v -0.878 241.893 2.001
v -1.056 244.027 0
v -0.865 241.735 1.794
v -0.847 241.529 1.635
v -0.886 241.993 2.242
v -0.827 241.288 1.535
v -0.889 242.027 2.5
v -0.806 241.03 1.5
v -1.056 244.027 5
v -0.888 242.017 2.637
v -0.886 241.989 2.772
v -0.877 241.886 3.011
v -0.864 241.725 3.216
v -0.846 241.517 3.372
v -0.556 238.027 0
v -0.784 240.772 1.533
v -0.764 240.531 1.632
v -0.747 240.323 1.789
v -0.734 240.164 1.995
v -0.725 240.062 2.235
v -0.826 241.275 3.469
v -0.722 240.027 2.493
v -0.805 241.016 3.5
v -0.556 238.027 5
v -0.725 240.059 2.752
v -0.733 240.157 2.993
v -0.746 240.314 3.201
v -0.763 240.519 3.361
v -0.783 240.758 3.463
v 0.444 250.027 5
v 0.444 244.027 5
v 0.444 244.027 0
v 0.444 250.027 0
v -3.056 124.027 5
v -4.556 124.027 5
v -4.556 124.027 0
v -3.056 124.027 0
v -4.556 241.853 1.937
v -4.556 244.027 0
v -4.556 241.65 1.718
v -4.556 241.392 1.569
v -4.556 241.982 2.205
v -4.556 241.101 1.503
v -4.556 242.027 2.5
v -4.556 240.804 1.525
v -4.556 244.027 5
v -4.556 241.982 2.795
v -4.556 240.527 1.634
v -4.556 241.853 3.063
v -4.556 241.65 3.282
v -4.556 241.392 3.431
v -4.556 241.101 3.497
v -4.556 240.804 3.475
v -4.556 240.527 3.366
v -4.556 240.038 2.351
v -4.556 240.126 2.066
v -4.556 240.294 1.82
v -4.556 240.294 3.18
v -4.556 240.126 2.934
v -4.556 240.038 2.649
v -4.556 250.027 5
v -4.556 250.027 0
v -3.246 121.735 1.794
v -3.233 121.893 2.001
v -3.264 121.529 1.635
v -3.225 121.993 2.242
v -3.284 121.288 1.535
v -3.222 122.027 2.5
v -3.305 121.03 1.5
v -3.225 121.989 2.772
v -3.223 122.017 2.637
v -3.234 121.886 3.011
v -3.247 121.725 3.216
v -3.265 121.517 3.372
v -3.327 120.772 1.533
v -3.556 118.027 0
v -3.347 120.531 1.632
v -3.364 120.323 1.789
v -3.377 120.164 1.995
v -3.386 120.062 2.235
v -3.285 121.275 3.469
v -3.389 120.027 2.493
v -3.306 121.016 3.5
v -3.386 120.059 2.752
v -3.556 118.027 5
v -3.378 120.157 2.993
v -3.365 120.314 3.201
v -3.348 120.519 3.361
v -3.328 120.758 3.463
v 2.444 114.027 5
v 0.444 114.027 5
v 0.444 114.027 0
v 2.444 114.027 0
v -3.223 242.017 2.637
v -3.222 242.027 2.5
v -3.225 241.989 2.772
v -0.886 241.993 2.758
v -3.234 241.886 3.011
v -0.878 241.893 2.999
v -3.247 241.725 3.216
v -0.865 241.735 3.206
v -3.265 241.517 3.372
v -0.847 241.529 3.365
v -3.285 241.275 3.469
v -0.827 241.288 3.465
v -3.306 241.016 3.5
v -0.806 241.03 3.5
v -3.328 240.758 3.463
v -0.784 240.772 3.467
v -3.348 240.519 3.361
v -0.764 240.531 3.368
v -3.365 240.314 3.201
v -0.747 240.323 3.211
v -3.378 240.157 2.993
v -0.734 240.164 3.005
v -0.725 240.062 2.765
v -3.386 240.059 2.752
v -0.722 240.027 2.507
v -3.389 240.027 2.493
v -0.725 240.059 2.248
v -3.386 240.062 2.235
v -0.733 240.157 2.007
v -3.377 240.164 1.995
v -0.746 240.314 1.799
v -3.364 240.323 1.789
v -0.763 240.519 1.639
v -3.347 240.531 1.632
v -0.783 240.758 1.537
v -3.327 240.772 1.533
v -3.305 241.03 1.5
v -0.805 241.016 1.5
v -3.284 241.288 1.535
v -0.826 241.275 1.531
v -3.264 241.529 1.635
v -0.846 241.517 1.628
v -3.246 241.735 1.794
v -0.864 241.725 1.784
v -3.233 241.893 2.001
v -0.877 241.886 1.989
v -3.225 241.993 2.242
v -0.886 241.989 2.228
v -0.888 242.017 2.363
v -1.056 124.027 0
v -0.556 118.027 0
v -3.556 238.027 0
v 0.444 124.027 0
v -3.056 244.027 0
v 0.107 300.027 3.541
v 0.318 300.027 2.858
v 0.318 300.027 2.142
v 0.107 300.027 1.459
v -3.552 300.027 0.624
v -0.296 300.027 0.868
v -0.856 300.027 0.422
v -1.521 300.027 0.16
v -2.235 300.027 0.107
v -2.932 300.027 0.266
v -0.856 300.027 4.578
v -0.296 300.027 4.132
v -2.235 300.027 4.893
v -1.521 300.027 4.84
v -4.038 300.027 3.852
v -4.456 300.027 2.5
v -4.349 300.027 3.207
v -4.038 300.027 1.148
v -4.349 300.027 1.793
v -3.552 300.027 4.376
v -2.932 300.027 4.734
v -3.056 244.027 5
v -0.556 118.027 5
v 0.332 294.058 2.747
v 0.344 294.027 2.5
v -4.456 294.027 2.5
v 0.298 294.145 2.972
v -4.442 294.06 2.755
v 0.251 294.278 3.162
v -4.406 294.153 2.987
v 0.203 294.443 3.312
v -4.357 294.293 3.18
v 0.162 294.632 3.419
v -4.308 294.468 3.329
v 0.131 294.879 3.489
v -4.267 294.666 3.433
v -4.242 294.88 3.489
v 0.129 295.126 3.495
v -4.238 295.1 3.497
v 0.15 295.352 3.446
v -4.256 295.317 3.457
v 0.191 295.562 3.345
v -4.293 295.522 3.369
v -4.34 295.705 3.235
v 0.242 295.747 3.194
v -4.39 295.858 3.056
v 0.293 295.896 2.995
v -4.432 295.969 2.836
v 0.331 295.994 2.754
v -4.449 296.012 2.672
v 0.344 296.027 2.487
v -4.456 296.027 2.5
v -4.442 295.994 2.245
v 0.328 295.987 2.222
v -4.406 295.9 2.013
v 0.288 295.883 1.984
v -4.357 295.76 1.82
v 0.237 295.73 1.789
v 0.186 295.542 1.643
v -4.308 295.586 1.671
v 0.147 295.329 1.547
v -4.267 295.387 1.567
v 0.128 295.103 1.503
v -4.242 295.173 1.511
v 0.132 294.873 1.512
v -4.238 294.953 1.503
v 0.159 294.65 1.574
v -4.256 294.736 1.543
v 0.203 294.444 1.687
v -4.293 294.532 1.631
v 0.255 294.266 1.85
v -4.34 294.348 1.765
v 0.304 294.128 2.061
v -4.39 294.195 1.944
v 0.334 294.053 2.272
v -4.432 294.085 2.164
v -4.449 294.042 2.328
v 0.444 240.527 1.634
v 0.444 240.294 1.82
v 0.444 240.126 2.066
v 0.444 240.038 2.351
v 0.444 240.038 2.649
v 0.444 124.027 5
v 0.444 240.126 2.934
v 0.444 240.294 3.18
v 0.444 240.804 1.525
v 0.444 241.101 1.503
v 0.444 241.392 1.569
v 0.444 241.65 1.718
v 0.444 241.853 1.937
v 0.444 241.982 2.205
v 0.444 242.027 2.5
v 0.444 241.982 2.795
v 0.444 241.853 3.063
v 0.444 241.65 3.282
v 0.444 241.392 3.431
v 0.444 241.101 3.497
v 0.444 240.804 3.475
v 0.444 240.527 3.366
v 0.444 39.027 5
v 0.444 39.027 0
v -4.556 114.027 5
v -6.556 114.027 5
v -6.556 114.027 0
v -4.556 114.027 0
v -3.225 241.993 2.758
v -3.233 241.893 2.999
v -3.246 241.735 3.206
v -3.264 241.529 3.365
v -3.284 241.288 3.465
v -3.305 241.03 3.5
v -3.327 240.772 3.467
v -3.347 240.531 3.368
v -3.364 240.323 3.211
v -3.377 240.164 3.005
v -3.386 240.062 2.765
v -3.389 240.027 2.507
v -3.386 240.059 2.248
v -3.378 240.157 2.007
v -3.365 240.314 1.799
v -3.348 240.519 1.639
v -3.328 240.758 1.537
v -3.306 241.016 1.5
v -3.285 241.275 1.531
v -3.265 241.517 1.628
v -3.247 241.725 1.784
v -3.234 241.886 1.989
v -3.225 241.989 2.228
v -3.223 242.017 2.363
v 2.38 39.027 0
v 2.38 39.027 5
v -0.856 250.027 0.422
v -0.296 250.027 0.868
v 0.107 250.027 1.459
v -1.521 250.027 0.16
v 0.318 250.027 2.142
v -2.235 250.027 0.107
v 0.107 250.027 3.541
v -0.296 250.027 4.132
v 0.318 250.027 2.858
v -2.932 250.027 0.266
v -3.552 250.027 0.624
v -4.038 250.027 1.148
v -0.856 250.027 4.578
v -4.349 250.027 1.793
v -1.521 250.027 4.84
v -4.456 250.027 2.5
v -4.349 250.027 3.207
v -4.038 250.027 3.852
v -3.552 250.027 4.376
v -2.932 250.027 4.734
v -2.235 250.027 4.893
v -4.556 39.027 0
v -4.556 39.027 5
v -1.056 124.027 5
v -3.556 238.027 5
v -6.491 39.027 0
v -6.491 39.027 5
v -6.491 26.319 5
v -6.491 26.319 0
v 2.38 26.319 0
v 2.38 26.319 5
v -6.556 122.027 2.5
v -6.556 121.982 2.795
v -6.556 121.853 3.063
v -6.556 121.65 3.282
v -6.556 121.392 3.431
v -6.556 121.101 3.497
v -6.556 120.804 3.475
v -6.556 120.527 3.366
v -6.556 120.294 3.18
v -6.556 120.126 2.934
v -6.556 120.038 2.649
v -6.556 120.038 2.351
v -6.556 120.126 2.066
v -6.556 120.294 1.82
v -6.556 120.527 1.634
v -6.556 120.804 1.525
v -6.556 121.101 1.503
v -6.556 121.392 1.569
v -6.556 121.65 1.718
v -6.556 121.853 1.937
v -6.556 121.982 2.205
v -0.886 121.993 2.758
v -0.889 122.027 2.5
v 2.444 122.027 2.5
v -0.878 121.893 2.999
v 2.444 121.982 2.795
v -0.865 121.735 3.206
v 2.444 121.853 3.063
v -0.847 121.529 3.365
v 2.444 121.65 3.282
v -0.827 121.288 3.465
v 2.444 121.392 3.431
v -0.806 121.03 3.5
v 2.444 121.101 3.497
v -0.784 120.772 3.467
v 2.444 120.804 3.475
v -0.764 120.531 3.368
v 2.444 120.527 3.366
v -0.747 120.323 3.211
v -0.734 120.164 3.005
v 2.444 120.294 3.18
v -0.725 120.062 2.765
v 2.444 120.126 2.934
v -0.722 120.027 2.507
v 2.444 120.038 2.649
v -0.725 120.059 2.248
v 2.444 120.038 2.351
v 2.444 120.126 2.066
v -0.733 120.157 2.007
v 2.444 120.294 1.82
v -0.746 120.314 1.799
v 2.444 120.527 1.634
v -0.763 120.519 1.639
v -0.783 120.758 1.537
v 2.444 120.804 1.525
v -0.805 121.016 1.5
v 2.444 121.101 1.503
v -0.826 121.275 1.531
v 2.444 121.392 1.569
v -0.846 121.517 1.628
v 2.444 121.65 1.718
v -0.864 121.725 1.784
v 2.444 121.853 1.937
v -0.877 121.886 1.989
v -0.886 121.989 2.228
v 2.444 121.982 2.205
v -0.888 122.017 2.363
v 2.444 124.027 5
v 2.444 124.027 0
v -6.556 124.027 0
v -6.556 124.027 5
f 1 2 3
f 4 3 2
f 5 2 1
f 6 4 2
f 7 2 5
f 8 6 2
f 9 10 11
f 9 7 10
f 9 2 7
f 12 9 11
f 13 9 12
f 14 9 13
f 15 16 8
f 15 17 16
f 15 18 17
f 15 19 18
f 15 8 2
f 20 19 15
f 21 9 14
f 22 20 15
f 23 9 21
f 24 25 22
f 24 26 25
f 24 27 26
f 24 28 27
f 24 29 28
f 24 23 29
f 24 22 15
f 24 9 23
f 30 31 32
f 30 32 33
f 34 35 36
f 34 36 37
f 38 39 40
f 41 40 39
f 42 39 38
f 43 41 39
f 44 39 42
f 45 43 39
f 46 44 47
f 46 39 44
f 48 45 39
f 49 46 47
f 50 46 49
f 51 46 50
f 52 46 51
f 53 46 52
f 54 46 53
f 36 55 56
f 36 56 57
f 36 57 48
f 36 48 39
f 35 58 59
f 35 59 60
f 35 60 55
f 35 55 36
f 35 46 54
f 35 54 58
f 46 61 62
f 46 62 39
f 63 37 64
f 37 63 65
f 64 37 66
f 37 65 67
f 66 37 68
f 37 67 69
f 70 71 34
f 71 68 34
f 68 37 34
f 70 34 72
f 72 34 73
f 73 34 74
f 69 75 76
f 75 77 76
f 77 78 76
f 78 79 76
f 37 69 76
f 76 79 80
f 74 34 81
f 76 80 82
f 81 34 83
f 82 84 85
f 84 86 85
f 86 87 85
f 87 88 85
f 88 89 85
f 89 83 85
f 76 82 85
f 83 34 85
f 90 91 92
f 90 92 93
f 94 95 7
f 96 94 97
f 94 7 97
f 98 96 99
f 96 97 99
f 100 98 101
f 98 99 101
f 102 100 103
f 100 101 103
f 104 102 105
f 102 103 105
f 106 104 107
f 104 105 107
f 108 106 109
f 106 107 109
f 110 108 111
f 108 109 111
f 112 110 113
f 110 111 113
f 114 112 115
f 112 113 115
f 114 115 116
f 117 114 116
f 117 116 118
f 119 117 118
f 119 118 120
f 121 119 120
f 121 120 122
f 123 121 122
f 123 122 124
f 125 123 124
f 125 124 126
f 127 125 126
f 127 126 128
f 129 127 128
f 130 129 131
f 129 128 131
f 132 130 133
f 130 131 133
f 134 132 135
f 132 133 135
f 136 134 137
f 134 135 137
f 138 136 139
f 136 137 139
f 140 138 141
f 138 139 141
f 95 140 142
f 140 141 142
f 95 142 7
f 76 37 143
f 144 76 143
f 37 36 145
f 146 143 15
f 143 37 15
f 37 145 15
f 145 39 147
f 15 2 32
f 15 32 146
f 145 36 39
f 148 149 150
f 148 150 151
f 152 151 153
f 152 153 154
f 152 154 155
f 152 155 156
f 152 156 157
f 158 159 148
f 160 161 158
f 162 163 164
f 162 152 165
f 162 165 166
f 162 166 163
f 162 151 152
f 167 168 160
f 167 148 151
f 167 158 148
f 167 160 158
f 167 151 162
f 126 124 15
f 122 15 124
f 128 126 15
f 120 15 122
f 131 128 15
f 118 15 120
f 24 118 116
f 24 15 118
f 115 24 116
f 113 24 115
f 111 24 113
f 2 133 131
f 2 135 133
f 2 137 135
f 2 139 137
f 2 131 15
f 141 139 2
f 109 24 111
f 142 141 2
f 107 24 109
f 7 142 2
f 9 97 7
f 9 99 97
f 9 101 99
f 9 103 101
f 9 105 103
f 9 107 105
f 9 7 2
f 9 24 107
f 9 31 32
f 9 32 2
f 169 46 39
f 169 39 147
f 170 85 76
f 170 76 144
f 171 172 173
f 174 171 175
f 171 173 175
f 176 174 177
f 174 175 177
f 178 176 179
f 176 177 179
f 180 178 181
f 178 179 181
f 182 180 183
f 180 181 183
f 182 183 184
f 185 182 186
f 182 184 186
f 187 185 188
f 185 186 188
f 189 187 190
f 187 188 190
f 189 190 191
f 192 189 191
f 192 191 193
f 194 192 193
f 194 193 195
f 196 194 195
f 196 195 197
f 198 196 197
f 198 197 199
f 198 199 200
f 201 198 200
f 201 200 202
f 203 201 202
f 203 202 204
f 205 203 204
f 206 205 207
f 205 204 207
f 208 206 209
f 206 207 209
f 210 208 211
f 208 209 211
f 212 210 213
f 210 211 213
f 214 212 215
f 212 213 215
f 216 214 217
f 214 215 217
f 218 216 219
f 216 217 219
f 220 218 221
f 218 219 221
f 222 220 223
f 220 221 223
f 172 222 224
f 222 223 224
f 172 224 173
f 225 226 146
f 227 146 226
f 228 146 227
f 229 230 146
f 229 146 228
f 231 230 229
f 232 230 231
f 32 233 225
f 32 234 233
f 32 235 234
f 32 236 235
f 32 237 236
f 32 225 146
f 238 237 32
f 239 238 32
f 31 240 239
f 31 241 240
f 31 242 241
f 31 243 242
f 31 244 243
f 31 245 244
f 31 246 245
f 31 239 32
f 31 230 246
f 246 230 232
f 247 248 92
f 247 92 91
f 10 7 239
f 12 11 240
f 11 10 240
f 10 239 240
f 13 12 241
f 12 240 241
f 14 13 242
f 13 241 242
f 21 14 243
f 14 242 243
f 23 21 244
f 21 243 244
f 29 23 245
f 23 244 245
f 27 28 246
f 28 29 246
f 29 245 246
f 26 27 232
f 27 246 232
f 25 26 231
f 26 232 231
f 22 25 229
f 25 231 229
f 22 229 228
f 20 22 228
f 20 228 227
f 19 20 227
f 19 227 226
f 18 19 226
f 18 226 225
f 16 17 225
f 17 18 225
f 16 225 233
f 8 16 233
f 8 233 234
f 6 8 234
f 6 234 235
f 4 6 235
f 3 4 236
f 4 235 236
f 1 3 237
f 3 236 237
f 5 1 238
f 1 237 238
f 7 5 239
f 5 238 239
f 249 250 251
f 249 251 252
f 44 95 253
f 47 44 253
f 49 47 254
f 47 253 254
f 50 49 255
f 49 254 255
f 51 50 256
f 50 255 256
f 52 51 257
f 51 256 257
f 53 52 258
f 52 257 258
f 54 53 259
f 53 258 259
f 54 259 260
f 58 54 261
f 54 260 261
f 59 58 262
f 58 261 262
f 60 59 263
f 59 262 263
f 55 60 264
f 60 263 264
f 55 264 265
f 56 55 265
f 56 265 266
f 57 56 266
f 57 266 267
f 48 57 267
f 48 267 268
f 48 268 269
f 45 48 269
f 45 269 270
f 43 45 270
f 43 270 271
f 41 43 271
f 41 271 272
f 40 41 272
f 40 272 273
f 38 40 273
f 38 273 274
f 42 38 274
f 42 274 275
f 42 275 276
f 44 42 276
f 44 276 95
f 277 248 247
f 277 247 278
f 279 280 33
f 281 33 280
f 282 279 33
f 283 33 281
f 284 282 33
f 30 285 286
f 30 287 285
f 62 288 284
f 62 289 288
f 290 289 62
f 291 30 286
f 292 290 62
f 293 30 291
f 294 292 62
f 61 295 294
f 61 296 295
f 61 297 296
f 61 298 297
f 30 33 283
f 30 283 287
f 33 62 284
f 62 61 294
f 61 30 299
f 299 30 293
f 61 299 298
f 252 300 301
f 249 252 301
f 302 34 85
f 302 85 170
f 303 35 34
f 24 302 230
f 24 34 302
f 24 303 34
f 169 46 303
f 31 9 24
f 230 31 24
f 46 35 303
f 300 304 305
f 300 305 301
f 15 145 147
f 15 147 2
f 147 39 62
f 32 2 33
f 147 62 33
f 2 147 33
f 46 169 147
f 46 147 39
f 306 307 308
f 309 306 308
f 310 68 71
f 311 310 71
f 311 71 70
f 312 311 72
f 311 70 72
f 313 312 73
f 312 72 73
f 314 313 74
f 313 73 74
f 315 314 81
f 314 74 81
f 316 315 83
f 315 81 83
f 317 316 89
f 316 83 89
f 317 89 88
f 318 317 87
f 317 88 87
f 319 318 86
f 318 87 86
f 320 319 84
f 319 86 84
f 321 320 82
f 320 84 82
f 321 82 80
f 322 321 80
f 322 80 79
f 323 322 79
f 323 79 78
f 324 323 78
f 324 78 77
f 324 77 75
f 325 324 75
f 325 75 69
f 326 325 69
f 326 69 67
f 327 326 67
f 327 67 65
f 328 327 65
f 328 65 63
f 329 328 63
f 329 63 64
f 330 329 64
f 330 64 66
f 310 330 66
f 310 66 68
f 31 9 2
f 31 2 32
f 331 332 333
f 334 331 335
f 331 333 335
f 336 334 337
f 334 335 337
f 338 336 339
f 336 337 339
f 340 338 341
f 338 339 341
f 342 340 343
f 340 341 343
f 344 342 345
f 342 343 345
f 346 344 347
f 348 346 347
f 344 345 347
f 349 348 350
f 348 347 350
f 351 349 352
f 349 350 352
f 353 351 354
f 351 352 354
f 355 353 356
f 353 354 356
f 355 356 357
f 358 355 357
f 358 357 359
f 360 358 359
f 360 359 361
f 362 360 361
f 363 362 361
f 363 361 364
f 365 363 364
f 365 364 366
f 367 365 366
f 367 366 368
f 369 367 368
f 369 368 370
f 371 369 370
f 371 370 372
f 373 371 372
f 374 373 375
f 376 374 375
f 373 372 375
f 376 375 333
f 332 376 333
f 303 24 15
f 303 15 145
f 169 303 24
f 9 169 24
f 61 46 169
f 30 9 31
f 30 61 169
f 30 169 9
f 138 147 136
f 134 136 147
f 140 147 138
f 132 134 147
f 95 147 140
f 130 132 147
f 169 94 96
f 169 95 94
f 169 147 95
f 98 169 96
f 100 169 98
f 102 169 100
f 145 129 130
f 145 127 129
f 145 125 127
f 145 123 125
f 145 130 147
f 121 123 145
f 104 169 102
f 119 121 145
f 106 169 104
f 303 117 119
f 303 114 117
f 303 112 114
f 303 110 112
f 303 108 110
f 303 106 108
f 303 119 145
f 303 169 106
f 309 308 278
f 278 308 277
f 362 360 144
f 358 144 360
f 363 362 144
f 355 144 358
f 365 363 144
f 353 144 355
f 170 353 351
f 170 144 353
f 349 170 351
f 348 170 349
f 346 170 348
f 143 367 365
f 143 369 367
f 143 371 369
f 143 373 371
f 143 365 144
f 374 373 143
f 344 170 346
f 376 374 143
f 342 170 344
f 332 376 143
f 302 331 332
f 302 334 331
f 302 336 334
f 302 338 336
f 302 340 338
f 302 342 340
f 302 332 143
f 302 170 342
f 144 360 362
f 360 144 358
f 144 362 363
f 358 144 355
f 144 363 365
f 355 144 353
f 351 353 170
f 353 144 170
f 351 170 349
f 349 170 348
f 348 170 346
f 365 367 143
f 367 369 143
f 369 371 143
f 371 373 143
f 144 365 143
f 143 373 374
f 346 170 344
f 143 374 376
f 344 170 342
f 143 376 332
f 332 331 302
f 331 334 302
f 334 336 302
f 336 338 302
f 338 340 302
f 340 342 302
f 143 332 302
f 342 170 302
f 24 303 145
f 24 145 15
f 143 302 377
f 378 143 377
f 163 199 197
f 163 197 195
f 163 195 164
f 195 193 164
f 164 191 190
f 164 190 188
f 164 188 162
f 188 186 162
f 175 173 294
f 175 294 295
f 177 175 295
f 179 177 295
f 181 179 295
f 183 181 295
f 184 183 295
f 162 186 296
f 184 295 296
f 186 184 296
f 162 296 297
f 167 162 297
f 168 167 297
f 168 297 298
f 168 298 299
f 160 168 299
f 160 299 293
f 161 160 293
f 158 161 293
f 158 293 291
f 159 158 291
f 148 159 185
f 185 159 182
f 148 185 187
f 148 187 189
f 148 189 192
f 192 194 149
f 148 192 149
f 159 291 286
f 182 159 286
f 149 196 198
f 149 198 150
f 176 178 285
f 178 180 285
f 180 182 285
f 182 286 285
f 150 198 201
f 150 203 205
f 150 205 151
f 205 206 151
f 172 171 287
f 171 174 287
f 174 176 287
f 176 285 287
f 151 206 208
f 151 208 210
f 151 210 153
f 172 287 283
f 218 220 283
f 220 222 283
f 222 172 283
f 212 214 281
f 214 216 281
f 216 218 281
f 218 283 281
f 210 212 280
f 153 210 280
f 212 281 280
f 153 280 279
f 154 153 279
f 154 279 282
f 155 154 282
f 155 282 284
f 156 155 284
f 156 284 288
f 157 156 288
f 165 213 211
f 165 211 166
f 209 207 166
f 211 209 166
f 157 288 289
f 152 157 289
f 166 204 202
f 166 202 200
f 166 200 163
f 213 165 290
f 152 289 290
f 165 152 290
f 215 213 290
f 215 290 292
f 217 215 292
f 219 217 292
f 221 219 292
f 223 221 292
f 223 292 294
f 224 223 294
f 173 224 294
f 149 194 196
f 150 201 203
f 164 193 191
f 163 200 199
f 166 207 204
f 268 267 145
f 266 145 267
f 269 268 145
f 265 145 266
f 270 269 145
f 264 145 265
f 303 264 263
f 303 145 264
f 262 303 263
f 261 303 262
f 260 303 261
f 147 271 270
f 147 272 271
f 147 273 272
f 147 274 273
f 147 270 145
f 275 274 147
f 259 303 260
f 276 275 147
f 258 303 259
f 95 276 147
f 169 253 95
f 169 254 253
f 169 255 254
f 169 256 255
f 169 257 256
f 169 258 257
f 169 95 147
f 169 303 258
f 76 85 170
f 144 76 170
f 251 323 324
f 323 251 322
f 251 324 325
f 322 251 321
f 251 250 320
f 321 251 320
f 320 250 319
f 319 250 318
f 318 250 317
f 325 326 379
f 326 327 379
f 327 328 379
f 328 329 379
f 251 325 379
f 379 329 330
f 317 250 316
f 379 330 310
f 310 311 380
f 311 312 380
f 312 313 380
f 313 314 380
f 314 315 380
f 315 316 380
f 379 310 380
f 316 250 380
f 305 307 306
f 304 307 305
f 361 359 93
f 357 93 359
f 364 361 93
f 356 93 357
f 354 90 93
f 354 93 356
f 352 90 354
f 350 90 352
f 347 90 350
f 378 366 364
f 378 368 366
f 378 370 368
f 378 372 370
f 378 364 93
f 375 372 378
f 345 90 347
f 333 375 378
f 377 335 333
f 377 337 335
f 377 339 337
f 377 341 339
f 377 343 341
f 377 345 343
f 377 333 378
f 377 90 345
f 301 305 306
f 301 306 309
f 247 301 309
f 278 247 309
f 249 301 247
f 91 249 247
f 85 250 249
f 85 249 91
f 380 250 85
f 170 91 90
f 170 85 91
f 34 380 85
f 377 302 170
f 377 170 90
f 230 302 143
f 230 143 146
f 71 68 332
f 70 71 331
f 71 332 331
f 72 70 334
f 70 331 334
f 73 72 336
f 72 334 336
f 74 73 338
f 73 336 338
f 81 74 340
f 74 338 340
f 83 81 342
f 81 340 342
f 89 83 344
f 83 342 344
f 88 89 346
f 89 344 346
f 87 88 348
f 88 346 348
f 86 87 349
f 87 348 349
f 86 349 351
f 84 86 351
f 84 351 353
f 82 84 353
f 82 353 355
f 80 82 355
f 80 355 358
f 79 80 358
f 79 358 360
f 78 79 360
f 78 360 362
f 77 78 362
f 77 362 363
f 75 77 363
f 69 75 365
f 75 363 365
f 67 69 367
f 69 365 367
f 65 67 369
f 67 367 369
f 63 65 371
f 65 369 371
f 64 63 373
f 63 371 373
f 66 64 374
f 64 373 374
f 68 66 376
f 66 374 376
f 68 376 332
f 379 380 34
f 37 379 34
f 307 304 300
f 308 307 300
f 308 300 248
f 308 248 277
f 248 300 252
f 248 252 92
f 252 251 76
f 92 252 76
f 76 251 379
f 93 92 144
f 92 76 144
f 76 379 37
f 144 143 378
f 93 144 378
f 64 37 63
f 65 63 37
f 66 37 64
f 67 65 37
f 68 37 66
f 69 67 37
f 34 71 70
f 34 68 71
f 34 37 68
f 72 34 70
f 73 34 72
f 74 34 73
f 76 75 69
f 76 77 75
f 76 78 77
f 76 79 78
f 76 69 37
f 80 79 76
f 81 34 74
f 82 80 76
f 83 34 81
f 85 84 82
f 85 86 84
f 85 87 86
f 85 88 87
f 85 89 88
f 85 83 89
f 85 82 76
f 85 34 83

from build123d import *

# Parameters (mm, degrees)
F0_W           = 8.8713987993
F0_H           = 12.7076974937
F1_DEPTH       = 5
F2_W           = 5
F2_H           = 5
F3_DEPTH       = 85
F4_W           = 2
F4_H           = 10
F5_DEPTH       = 5
F6_DEPTH       = 5
F8_DEPTH       = 5
F9_R           = 1
F10_DEPTH      = 10
F11_R          = 1
F12_DEPTH      = 8
F12_DEPTH_BACK = 3
F13_DEPTH      = 5
F14_DEPTH      = 5
F15_R          = 2.4
F16_DEPTH      = 50
F17_R          = 1
F18_DEPTH      = 5
F19_DEPTH      = 5
F20_R          = 1
F21_DEPTH      = 5


# Not quite as in the source:
# - a feature names something its author has since deleted; it is built from what else it names


with BuildPart() as f1:
    # F0 (on Top) → F1 (new body)
    with BuildSketch(Plane.XY):
        with Locations((-2.0555156266, 32.6728799325)):
            Rectangle(F0_W, F0_H)
    extrude(amount=F1_DEPTH)

    # F2 (on face) → F3 (join)
    with BuildSketch(Plane(origin=(0, 39.0267286794, 0), x_dir=(-1, 0, 0), z_dir=(0, 1, 0))):
        with Locations((2.0555156266, 2.5)):
            Rectangle(F2_W, F2_H)
    extrude(amount=F3_DEPTH)

    # F4 (on face) → F5 (join)
    with BuildSketch(Plane.XY.offset(5)):
        with Locations((-5.5555156266, 119.0267286794)):
            Rectangle(F4_W, F4_H)
        with Locations((1.4444843734, 119.0267286794)):
            Rectangle(F4_W, F4_H)
    extrude(amount=-F5_DEPTH)

    # F4 (on face) → F6 (cut)
    with BuildSketch(Plane.XY.offset(5)):
        Polygon((-1.0555156266, 124.0267286794), (-3.0555156266, 124.0267286794), (-3.5555156266, 118.0267286794), (-0.5555156266, 118.0267286794), align=None)
    extrude(amount=-F6_DEPTH, mode=Mode.SUBTRACT)


with BuildPart() as f8:
    # F7 (on face) → F8 (new body)
    with BuildSketch(Plane.XY.offset(5)):
        Polygon((-1.0555156266, 124.0267286794), (0.4444843734, 124.0267286794), (0.4444843734, 244.0267286794), (-1.0555156266, 244.0267286794), (-0.5555156266, 238.0267286794), (-3.5555156266, 238.0267286794), (-3.0555156266, 244.0267286794), (-4.5555156266, 244.0267286794), (-4.5555156266, 124.0267286794), (-3.0555156266, 124.0267286794), (-3.5555156266, 118.0267286794), (-0.5555156266, 118.0267286794), align=None)
    extrude(amount=-F8_DEPTH)


with BuildPart() as f10_tool:
    # F9 (on face) → F10 (new body)
    with BuildSketch(Plane.YZ.offset(2.4444843734)):
        with Locations((121.0267286794, 2.5)):
            Circle(F9_R)
    extrude(amount=-F10_DEPTH)


with BuildPart() as f1_1:
    add(f1.part)

    # F10: cut by f10_tool
    add(f10_tool.part, mode=Mode.SUBTRACT)

    # F11 (on face) → F12 (cut, two sides)
    with BuildSketch(Plane.YZ.offset(0.4444843734)) as f12_sk:
        with Locations((121.0267286794, 2.5)):
            Circle(F11_R)
    extrude(amount=-F12_DEPTH, mode=Mode.SUBTRACT)
    extrude(f12_sk.sketch, amount=F12_DEPTH_BACK, mode=Mode.SUBTRACT)

    # F7 (on face) → F13 (cut)
    with BuildSketch(Plane.XY.offset(5)):
        Polygon((-1.0555156266, 244.0267286794), (0.4444843734, 244.0267286794), (0.4444843734, 250.0267286794), (-4.5555156266, 250.0267286794), (-4.5555156266, 244.0267286794), (-3.0555156266, 244.0267286794), (-3.5555156266, 238.0267286794), (-0.5555156266, 238.0267286794), align=None)
    extrude(amount=-F13_DEPTH, mode=Mode.SUBTRACT)

    # F17 (on face) → F19 (cut)
    with BuildSketch(Plane.YZ.offset(0.4444843734)):
        with Locations((241.0267286794, 2.5)):
            Circle(F17_R)
    extrude(amount=-F19_DEPTH, mode=Mode.SUBTRACT)


with BuildPart() as f8_1:
    add(f8.part)

    # F10: cut by f10_tool
    add(f10_tool.part, mode=Mode.SUBTRACT)


with BuildPart() as f14:
    # F7 (on face) → F14 (new body)
    with BuildSketch(Plane.XY.offset(5)):
        Polygon((-1.0555156266, 244.0267286794), (0.4444843734, 244.0267286794), (0.4444843734, 250.0267286794), (-4.5555156266, 250.0267286794), (-4.5555156266, 244.0267286794), (-3.0555156266, 244.0267286794), (-3.5555156266, 238.0267286794), (-0.5555156266, 238.0267286794), align=None)
    extrude(amount=-F14_DEPTH)

    # F15 (on face) → F16 (join)
    with BuildSketch(Plane(origin=(0, 250.0267286794, 0), x_dir=(-1, 0, 0), z_dir=(0, 1, 0))):
        with Locations((2.0555156266, 2.5)):
            Circle(F15_R)
    extrude(amount=F16_DEPTH)


with BuildPart() as f18_tool:
    # F17 (on face) → F18 (new body)
    with BuildSketch(Plane.YZ.offset(0.4444843734)):
        with Locations((241.0267286794, 2.5)):
            Circle(F17_R)
    extrude(amount=-F18_DEPTH)


with BuildPart() as f8_2:
    add(f8_1.part)

    # F18: cut by f18_tool
    add(f18_tool.part, mode=Mode.SUBTRACT)


with BuildPart() as f14_1:
    add(f14.part)

    # F18: cut by f18_tool
    add(f18_tool.part, mode=Mode.SUBTRACT)

    # F20 (on face) → F21 (cut)
    with BuildSketch(Plane(origin=(-4.5555156266, 0, 0), x_dir=(0, -1, 0), z_dir=(-1, 0, 0))):
        with Locations((-295.0267286794, 2.5)):
            Circle(F20_R)
    extrude(amount=-F21_DEPTH, mode=Mode.SUBTRACT)


solid = Compound([f1_1.part, f8_2.part, f14_1.part])
